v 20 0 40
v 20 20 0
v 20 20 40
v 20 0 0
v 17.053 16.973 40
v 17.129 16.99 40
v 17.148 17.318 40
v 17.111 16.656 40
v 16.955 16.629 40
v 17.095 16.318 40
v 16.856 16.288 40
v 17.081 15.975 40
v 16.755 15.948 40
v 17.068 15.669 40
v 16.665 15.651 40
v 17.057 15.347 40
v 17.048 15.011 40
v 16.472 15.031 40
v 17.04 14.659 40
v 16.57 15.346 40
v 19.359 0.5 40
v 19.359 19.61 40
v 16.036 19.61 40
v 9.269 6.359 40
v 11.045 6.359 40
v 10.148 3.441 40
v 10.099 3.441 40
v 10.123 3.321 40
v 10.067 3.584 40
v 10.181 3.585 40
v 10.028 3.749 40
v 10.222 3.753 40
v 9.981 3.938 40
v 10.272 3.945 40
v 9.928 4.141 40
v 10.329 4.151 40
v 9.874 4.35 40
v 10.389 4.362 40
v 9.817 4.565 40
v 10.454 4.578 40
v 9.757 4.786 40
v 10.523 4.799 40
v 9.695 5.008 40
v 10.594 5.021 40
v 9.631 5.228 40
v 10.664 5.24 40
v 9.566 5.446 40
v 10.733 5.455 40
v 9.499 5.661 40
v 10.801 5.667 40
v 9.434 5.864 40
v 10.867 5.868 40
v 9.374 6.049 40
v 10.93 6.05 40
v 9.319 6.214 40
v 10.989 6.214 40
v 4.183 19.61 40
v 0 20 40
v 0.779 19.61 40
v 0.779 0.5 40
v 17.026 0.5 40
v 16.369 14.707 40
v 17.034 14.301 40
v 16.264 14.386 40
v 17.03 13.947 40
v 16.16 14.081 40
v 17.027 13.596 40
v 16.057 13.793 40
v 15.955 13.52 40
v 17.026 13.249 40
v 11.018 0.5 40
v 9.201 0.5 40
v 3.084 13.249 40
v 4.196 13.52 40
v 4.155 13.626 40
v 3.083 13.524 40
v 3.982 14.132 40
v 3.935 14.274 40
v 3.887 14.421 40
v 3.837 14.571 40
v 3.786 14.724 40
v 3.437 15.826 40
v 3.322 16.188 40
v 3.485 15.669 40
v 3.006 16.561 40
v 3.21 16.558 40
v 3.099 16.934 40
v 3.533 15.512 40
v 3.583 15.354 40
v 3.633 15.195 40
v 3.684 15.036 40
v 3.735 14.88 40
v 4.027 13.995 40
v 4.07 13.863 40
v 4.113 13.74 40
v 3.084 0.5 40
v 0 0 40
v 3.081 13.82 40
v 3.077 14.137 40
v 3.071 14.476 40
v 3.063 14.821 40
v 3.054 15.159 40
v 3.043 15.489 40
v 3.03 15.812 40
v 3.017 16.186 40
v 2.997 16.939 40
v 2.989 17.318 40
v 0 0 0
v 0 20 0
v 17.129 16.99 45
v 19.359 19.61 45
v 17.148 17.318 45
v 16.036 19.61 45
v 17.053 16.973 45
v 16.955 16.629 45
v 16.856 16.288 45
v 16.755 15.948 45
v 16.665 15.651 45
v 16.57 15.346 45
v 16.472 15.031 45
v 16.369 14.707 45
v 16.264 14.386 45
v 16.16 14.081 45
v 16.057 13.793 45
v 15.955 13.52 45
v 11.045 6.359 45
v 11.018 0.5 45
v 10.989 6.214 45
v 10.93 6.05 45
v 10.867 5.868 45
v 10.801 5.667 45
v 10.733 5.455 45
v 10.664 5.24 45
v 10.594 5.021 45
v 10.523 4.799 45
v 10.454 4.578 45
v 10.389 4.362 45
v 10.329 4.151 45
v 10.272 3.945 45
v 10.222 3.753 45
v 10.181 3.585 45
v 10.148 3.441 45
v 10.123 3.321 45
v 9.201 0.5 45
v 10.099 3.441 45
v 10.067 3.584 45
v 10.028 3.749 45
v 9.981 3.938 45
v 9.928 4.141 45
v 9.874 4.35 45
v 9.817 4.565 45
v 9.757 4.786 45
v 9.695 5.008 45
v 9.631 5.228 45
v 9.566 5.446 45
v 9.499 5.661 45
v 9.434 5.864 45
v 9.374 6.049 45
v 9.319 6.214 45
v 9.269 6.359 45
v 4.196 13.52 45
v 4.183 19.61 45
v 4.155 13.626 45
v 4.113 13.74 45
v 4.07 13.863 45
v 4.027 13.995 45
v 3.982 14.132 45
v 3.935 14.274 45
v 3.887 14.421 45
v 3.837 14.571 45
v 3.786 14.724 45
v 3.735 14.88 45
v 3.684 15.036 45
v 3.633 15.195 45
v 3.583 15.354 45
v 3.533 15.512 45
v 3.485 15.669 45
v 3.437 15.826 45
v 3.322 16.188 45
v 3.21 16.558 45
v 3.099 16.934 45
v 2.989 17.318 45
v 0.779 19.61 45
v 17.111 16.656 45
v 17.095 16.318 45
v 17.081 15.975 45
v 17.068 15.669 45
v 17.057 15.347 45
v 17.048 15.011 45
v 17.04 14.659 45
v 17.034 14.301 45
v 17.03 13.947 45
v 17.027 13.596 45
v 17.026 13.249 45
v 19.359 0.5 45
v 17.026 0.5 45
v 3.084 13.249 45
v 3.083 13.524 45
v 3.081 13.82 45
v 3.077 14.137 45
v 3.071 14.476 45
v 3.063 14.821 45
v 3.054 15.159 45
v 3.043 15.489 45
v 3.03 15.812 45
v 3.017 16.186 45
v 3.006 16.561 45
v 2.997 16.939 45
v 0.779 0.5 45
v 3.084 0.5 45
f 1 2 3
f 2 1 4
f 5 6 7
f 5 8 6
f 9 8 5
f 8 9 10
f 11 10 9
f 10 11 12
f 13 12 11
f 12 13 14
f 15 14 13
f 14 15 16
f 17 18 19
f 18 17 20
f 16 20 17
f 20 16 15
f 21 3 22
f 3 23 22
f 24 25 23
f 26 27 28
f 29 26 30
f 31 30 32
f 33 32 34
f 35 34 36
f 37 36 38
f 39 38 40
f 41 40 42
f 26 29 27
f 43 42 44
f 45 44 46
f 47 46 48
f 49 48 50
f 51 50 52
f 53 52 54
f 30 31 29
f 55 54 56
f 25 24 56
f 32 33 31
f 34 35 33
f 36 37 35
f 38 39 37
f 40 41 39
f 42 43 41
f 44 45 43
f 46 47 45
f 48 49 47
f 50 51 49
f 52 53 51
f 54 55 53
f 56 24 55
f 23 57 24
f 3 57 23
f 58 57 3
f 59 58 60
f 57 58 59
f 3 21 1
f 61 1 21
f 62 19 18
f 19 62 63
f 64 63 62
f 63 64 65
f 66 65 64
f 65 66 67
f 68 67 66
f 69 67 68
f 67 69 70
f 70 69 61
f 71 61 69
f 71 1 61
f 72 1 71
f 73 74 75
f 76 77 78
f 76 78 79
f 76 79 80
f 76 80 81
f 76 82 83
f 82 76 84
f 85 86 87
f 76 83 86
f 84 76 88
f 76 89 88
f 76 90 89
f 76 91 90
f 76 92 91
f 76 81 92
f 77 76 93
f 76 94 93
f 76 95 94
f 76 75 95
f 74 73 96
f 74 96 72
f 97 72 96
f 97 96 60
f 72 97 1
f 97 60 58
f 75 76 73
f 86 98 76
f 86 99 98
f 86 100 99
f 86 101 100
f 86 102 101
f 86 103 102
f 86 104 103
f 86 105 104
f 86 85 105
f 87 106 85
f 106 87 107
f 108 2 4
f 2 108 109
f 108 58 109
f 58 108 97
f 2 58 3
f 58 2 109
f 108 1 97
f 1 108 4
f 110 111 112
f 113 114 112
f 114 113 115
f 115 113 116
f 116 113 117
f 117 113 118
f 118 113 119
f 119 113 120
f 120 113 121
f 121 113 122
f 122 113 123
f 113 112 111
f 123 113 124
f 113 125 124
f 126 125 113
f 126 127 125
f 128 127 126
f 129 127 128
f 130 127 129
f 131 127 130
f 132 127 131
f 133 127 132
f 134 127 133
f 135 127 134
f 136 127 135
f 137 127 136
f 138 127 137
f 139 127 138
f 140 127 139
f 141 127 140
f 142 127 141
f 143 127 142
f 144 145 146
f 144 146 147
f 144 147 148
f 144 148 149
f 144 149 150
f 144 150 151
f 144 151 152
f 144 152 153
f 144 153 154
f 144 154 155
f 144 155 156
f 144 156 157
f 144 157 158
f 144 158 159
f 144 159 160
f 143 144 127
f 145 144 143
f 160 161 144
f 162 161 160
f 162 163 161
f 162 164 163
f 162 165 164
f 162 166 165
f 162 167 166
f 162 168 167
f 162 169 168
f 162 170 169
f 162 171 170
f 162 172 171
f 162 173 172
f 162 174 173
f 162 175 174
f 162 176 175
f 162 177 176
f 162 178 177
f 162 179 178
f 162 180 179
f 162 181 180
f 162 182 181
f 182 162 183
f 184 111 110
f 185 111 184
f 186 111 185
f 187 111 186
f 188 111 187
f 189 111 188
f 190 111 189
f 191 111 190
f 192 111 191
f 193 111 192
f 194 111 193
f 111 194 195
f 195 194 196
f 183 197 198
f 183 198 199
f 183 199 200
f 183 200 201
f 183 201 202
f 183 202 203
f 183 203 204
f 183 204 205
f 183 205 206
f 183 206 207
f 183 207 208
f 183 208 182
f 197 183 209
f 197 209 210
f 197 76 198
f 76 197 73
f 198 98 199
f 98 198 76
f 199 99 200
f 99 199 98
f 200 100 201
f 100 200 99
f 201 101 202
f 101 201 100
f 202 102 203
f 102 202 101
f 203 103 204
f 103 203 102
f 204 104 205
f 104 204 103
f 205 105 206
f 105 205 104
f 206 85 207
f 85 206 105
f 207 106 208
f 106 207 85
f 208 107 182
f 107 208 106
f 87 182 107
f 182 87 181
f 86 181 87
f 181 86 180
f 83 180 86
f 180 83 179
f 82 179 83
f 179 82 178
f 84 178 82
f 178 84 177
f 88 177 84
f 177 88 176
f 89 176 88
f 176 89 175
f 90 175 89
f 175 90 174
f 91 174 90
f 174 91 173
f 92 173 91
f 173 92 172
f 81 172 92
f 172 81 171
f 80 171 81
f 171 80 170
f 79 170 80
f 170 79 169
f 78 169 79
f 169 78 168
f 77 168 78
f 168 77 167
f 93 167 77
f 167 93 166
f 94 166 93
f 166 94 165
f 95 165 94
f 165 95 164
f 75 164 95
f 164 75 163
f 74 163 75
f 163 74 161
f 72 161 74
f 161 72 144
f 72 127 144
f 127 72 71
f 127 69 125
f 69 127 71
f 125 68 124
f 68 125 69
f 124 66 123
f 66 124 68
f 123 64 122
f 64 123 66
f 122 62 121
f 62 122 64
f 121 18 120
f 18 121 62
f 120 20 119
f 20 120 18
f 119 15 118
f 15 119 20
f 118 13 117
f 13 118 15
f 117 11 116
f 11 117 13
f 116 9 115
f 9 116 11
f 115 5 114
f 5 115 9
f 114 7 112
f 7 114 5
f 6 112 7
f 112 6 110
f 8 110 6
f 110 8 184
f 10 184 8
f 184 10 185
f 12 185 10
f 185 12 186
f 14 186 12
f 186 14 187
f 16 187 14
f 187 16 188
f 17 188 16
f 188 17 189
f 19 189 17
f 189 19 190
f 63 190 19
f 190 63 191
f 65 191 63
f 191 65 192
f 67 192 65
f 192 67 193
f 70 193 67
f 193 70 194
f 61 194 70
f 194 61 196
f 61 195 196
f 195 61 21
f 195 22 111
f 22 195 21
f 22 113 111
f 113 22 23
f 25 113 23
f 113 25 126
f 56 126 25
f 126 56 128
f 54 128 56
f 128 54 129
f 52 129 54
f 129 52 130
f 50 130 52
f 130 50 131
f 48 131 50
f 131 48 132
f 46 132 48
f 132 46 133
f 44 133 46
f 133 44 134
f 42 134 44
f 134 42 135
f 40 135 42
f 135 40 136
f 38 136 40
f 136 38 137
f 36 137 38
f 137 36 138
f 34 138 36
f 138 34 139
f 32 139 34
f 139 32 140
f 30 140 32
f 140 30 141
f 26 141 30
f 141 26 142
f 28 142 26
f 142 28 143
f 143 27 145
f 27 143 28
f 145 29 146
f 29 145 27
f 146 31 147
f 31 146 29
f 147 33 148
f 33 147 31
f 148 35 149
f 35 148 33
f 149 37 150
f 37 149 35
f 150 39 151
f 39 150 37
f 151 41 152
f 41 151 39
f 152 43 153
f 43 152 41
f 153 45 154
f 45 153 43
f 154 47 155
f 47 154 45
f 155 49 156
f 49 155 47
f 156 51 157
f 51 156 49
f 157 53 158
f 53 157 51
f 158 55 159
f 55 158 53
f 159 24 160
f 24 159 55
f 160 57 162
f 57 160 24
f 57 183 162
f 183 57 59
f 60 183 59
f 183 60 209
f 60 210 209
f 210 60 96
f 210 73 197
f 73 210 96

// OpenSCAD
cube([20, 20, 40]);
translate([-1.5, 0.5, 40]){
    linear_extrude(5){
        text("M", size=20);
    }
}
